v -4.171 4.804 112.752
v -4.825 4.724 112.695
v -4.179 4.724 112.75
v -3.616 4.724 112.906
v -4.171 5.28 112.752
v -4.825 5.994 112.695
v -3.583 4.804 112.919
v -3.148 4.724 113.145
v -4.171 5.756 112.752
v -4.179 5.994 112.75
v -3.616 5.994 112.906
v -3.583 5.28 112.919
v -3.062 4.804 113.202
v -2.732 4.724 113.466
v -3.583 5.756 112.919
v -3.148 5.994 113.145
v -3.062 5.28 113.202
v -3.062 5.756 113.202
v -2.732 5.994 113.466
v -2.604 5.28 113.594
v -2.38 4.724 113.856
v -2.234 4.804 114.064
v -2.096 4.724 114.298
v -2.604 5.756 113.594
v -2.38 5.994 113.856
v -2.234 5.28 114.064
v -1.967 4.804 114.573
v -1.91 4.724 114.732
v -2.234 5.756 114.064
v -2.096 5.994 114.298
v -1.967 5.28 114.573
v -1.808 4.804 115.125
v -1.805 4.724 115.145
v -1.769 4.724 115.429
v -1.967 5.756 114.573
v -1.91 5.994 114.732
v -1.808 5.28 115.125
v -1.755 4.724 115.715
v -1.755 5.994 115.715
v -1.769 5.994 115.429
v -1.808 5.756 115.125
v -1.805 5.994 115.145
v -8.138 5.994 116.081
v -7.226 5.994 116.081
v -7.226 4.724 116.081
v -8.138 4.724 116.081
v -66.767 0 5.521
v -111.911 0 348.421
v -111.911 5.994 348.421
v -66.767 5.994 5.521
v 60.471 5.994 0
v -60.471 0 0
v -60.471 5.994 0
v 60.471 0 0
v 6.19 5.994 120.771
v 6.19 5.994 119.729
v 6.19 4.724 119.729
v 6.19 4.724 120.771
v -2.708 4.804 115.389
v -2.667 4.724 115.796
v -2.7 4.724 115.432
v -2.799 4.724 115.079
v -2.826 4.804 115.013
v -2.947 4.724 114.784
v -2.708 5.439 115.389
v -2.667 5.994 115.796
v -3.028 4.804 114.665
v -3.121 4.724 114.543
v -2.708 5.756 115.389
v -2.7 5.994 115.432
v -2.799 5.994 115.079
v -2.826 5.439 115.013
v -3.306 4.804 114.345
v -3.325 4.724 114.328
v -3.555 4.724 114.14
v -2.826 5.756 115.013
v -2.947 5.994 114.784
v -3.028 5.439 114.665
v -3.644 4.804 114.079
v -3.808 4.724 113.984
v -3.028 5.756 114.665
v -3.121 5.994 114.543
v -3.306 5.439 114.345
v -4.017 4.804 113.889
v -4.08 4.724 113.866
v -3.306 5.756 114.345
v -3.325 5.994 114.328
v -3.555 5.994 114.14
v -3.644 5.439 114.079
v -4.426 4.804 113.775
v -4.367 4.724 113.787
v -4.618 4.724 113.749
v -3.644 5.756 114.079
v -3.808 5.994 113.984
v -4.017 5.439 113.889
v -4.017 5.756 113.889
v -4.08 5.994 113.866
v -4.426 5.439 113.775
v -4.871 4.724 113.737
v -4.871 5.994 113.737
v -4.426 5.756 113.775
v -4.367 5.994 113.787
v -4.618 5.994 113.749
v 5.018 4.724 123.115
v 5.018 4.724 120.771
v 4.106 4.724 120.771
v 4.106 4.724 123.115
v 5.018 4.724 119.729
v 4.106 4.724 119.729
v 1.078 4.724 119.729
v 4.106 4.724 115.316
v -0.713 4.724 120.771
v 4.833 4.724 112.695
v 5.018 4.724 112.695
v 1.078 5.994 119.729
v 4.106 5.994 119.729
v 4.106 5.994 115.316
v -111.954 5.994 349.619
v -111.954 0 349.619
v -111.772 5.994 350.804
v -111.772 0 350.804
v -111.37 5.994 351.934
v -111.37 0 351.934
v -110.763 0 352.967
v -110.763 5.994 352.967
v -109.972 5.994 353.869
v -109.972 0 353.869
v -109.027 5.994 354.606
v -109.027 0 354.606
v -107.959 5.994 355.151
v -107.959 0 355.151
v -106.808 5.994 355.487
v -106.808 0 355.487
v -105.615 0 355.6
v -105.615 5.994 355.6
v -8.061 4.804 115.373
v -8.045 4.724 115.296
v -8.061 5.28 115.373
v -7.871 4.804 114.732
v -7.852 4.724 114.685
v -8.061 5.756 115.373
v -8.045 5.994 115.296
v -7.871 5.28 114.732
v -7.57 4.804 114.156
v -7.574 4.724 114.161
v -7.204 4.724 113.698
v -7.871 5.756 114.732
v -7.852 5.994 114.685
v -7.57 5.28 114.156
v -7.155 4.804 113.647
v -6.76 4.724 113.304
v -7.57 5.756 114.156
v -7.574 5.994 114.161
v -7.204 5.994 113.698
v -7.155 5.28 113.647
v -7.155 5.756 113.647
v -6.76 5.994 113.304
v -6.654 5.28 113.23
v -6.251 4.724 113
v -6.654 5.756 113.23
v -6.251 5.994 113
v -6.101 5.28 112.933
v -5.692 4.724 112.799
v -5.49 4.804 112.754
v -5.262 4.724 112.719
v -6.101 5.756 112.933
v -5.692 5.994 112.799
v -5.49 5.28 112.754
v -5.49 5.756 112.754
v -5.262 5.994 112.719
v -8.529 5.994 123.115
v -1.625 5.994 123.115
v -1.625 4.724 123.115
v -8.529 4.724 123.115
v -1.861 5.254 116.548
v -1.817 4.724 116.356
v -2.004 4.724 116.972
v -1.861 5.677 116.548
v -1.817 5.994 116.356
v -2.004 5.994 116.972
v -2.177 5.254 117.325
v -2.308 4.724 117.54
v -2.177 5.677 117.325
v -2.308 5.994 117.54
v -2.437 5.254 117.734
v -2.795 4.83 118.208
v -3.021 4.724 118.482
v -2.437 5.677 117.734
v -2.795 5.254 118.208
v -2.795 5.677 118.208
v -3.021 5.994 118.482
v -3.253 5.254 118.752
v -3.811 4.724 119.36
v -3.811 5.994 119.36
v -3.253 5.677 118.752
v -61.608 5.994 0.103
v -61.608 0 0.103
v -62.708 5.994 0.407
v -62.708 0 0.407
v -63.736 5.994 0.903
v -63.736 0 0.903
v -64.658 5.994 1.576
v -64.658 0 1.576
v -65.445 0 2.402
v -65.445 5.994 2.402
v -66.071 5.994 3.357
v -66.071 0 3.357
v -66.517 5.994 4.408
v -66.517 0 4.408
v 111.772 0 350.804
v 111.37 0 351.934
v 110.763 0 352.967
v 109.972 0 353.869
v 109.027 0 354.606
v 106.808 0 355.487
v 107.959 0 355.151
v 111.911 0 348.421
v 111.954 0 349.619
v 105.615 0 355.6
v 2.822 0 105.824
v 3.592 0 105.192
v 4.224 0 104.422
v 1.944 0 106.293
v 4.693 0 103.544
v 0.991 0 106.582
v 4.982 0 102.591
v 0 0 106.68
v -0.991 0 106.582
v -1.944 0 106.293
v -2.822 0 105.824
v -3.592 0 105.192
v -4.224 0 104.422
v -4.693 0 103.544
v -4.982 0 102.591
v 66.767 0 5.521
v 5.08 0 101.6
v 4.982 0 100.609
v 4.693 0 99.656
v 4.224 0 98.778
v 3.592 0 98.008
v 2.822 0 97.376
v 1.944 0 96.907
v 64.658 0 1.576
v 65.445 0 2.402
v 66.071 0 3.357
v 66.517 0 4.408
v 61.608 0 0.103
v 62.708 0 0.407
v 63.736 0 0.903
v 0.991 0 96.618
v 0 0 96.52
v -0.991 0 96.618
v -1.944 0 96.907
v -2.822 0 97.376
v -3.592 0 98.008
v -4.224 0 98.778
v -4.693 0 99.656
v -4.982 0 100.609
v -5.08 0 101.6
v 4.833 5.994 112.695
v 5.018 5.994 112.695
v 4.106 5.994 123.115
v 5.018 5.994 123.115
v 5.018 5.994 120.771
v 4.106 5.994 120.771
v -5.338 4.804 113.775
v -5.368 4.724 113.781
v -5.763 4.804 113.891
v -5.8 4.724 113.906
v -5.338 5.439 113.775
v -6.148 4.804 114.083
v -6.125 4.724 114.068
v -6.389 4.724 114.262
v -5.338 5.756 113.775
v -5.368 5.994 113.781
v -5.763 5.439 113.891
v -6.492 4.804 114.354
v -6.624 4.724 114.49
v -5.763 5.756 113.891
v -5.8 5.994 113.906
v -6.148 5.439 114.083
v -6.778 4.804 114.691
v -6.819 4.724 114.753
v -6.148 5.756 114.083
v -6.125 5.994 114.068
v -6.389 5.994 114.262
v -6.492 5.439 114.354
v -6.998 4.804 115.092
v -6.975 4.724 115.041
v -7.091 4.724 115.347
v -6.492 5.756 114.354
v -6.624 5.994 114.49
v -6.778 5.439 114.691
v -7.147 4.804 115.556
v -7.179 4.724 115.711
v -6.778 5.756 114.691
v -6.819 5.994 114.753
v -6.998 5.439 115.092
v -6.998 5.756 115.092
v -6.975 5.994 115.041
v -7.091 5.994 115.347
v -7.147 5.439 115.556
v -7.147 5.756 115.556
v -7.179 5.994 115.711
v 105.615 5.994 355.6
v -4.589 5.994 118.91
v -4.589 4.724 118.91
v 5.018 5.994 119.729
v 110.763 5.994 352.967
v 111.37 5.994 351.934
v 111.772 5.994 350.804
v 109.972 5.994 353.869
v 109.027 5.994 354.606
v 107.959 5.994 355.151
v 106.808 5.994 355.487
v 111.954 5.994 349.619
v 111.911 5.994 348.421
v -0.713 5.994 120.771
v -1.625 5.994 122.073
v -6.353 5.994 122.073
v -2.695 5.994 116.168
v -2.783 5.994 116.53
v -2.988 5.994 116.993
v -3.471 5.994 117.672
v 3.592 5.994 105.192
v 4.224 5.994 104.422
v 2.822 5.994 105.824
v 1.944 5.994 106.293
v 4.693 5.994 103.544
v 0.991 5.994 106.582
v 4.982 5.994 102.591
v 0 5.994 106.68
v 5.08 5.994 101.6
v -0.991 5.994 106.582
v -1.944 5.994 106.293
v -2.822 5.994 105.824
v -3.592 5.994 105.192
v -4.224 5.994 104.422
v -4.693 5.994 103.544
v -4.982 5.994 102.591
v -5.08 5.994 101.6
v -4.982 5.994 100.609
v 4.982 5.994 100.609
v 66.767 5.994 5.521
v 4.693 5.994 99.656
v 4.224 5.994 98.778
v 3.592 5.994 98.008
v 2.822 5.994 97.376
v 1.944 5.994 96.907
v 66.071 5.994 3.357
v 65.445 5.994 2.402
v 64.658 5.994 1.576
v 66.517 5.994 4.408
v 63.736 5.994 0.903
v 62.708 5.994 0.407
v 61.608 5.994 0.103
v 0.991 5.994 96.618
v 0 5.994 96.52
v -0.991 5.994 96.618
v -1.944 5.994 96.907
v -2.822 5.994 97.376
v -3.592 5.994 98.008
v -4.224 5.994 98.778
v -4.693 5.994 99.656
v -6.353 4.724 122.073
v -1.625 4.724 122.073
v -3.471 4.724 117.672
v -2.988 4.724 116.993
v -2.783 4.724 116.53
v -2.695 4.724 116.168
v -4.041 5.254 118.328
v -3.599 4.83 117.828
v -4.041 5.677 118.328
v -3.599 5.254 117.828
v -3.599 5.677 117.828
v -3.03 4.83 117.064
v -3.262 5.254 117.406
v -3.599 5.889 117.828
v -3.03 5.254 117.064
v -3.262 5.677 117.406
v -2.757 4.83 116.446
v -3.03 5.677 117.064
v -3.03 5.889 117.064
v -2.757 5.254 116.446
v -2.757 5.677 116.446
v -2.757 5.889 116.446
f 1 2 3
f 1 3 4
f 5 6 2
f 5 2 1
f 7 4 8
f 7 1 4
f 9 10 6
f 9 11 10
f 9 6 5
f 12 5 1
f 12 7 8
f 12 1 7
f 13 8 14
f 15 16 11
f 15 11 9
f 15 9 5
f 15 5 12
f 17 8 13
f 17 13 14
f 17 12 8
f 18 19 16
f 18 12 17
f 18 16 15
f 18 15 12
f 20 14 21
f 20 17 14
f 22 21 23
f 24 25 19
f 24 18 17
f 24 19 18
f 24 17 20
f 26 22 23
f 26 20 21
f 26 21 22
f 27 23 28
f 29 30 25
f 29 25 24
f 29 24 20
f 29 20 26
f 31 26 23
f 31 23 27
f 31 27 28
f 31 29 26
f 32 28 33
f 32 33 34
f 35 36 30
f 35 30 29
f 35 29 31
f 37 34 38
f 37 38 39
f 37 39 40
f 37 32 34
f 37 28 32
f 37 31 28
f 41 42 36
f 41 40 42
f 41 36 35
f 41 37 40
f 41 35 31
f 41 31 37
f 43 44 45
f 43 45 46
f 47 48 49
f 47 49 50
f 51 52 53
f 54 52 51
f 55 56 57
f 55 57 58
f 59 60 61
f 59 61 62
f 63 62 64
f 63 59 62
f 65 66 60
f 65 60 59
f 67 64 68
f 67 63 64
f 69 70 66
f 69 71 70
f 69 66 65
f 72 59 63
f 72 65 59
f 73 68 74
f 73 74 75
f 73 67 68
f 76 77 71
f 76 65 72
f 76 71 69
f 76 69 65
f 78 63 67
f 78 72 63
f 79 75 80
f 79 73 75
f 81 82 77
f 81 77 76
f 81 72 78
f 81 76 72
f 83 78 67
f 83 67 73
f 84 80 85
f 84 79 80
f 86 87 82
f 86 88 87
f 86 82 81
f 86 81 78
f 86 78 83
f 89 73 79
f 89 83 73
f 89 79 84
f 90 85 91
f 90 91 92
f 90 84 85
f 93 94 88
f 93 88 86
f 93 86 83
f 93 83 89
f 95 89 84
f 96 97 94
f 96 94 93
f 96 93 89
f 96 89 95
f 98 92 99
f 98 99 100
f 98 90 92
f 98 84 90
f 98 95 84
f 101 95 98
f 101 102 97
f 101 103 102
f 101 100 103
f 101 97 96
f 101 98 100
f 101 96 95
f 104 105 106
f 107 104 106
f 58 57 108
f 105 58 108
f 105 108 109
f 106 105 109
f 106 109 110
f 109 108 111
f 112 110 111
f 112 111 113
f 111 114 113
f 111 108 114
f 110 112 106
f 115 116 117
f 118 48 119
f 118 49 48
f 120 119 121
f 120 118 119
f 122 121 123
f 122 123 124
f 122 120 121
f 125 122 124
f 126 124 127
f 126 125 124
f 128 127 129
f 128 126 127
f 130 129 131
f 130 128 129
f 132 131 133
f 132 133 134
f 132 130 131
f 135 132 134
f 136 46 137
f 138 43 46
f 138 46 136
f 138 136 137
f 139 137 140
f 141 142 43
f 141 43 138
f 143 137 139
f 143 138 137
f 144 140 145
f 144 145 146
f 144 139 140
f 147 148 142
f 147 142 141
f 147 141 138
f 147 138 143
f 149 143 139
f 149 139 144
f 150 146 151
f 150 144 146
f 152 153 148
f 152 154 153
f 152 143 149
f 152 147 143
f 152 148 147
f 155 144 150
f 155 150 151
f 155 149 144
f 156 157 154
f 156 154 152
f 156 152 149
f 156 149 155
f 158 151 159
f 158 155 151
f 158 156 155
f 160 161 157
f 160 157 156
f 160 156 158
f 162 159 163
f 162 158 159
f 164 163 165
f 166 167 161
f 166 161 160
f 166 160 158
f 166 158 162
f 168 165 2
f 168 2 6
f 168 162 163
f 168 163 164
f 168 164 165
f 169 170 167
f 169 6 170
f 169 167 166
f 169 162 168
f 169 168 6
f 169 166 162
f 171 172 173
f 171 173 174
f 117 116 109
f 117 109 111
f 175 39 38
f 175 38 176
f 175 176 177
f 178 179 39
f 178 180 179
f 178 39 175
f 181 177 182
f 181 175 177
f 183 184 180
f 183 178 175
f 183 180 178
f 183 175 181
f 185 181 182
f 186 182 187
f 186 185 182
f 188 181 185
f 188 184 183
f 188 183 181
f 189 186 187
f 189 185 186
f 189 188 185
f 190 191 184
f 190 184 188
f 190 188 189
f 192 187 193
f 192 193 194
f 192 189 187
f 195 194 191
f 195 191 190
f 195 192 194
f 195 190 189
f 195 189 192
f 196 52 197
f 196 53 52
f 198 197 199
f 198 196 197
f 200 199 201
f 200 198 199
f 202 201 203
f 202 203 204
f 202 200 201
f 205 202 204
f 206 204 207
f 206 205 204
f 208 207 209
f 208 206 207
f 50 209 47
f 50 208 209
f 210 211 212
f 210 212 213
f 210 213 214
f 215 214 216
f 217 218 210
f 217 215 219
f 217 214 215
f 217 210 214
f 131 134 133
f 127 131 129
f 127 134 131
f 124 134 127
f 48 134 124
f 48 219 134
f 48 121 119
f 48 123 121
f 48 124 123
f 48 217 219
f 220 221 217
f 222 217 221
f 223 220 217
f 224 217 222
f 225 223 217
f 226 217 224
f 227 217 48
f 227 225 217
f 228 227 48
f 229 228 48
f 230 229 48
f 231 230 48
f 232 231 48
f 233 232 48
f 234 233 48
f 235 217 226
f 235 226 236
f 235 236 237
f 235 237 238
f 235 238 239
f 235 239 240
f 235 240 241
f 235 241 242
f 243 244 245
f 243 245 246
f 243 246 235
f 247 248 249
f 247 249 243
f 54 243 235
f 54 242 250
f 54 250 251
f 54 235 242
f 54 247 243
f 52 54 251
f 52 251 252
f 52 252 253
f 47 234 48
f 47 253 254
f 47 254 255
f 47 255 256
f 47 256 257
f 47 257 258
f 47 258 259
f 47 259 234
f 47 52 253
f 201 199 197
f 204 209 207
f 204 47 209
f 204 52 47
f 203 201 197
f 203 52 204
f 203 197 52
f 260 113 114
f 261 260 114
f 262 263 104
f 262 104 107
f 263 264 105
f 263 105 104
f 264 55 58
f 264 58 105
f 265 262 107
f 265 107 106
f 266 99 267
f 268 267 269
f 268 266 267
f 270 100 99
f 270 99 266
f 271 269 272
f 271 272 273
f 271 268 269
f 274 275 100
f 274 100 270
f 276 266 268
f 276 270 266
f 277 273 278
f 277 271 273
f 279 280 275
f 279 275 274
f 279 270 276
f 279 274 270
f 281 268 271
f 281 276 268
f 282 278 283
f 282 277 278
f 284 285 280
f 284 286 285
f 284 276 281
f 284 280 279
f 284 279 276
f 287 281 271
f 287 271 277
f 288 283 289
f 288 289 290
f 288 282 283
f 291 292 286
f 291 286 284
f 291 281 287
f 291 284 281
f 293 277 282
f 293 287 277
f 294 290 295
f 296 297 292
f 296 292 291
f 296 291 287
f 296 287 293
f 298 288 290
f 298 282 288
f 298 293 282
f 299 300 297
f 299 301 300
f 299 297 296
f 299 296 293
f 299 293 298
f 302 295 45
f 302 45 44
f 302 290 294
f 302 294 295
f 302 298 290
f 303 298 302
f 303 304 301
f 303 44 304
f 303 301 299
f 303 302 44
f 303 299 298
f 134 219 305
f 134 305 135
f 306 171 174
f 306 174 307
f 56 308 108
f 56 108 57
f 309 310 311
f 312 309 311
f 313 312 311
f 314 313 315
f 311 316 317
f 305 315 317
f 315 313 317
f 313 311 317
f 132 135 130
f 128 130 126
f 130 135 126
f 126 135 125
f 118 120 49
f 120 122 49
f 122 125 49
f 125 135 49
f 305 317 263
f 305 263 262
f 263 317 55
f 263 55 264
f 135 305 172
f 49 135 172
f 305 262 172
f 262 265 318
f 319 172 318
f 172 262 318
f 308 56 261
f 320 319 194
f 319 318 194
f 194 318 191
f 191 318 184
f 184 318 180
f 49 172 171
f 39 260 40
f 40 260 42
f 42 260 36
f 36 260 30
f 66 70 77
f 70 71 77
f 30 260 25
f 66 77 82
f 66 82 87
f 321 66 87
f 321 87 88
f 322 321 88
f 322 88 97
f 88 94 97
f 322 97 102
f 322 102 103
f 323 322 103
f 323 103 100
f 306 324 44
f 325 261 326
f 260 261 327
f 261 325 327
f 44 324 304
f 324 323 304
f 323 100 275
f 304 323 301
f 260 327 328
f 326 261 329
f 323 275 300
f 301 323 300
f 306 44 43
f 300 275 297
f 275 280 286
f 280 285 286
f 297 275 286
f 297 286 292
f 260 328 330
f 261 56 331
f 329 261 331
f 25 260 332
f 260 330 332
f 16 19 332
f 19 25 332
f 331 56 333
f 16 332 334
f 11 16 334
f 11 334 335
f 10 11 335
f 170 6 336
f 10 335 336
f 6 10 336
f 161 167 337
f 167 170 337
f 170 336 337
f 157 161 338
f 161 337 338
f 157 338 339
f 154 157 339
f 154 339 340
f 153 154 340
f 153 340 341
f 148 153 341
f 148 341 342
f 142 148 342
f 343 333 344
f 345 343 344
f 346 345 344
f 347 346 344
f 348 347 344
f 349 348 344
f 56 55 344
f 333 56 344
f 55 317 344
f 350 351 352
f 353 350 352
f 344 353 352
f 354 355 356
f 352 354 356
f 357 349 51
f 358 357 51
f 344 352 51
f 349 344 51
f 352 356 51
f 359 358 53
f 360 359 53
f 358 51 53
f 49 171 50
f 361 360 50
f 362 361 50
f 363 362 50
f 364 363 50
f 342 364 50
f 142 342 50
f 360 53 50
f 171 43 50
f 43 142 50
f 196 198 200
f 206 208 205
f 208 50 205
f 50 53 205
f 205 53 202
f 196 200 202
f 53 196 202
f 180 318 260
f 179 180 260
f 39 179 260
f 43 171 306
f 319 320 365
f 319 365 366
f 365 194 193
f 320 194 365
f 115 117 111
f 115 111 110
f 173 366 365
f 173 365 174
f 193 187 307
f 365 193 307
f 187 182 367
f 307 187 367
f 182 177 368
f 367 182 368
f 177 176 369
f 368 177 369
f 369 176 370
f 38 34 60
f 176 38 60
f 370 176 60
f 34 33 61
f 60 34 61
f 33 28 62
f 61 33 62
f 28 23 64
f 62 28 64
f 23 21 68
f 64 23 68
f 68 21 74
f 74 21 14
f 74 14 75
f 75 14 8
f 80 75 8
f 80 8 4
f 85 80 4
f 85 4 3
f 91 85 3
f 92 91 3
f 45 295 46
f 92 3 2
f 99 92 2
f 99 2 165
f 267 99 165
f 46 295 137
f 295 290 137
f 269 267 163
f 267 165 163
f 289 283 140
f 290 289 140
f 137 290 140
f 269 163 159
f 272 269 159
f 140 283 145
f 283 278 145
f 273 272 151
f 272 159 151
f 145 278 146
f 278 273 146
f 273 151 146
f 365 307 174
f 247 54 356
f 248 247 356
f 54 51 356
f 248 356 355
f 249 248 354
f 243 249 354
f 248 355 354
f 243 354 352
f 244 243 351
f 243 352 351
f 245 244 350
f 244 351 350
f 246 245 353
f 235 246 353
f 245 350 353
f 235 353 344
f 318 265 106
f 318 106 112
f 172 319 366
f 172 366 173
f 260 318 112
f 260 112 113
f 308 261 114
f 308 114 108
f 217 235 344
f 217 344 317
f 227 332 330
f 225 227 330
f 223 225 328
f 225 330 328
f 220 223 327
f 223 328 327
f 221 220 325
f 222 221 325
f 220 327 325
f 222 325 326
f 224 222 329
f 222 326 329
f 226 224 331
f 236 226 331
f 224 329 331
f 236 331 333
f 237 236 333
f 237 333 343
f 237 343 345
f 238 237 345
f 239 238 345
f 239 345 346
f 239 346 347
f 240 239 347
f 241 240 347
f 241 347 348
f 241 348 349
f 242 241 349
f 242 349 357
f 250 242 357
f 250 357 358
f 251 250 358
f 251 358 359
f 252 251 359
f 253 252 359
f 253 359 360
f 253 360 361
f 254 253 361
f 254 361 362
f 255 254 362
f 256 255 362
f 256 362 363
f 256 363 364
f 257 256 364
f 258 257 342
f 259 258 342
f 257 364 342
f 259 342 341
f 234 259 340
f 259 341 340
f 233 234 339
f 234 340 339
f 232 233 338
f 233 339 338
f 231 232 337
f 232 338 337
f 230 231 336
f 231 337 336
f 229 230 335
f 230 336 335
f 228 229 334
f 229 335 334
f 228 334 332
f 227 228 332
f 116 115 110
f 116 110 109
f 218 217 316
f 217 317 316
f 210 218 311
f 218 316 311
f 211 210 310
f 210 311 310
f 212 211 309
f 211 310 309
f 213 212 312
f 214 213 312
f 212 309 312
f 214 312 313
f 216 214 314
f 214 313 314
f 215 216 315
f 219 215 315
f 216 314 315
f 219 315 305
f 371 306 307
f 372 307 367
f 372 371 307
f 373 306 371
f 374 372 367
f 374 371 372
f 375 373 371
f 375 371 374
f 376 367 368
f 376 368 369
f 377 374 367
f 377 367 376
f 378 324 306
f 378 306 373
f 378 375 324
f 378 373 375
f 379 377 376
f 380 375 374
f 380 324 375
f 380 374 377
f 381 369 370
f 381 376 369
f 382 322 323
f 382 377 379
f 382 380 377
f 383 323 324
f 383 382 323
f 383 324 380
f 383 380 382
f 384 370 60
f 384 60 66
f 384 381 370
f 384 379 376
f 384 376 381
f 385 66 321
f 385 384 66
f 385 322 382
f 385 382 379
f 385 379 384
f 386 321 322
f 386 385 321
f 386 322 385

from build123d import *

# Parameters (mm, degrees)
BOSS_EXTRUDE1_DEPTH = 5.9944
SKETCH2_R           = 5.08
CUT_EXTRUDE1_DEPTH  = 374.126902856
CUT_EXTRUDE2_DEPTH  = 1.27
FILLET1_R           = 6.35


with BuildPart() as part:
    # Sketch1 → Boss-Extrude1 (new body)
    with BuildSketch(Plane(origin=(0, 0, 0), x_dir=(1, 0, 0), z_dir=(0, 1, 0))):
        Polygon((-66.04, 0), (66.04, 0), (112.855628142, -355.6), (-112.855628142, -355.6), align=None)
    extrude(amount=BOSS_EXTRUDE1_DEPTH)

    # Sketch2 → Cut-Extrude1 (cut, through all)
    with BuildSketch(Plane(origin=(0, 5.9944, 0), x_dir=(1, 0, 0), z_dir=(0, 1, 0))):
        with Locations(Location((0, -101.6, 0), (0, 0, 270))):
            Circle(SKETCH2_R)
    extrude(amount=-CUT_EXTRUDE1_DEPTH, mode=Mode.SUBTRACT)

    # Sketch3 → Cut-Extrude2 (cut)
    # profile 1 of 2: a face of its own
    with BuildSketch(Plane(origin=(0, 5.9944, 0), x_dir=(1, 0, 0), z_dir=(0, 1, 0))):
        with BuildLine():
            Line((-7.226250791, -116.081432875), (-8.138045663, -116.081432875))
            add(Edge.make_bspline(
                [(-8.138045663, -116.081432875), (-8.13210307, -115.960468241), (-8.120431976, -115.722896918), (-8.065776142, -115.376516664), (-7.987570625, -115.045431877), (-7.876996575, -114.732300927), (-7.739673209, -114.434355132), (-7.574994044, -114.152777944), (-7.379939895, -113.888643522), (-7.158722633, -113.644400479), (-6.918457097, -113.420335988), (-6.659214713, -113.22684534), (-6.386796005, -113.063363186), (-6.102027464, -112.926693067), (-5.801696228, -112.824106543), (-5.488527704, -112.747988869), (-5.161145982, -112.702192391), (-4.938090375, -112.697269768), (-4.824648227, -112.694766208)],
                knots=[0, 0, 0, 0, 1.10065271, 2.161652631, 3.183658789, 4.190468796, 5.17591951, 6.163126047, 7.15150782, 8.156236427, 9.156009102, 10.134482811, 11.092018607, 12.041330605, 13.001268258, 13.972401359, 14.968799086, 16, 16, 16, 16], degree=3))
            add(Edge.make_bspline(
                [(-4.824648227, -112.694766208), (-4.713242161, -112.697374299), (-4.49433322, -112.702499104), (-4.174838915, -112.746509406), (-3.870685397, -112.815439466), (-3.582467195, -112.91214936), (-3.312483876, -113.042152155), (-3.058707267, -113.198318725), (-2.818116113, -113.378934007), (-2.601543278, -113.591579362), (-2.402674111, -113.818589713), (-2.231108708, -114.06094317), (-2.084185925, -114.311254468), (-1.961721117, -114.571432333), (-1.871569582, -114.843926518), (-1.803125412, -115.124769827), (-1.764437834, -115.416869279), (-1.758500262, -115.61457288), (-1.755481561, -115.715086721)],
                knots=[0, 0, 0, 0, 1.111607364, 2.184268762, 3.212621178, 4.221274766, 5.211760367, 6.196651075, 7.1921475, 8.207485113, 9.220403448, 10.201281604, 11.166441695, 12.114753415, 13.065576456, 14.026450734, 14.996634279, 16, 16, 16, 16], degree=3))
            add(Edge.make_bspline(
                [(-1.755481561, -115.715086721), (-1.760396861, -115.856594721), (-1.770141205, -116.137127455), (-1.853494938, -116.549376314), (-1.983677953, -116.948790353), (-2.140424566, -117.270244922), (-2.298550289, -117.529277006), (-2.441044311, -117.742546161), (-2.607856448, -117.972178035), (-2.801414602, -118.217403677), (-3.017714826, -118.480143905), (-3.258716305, -118.760239997), (-3.526137613, -119.054798048), (-3.713832004, -119.255982308), (-3.811090535, -119.360230952)],
                knots=[0, 0, 0, 0, 1.184426356, 2.348067706, 3.509069118, 4.696110526, 5.333549288, 6.050745305, 6.844228056, 7.710549037, 8.667450064, 9.695053472, 10.805634456, 12, 12, 12, 12], degree=3))
            Line((-3.811090535, -119.360230952), (-6.353125791, -122.073227747))
            Line((-6.353125791, -122.073227747), (-1.62522515, -122.073227747))
            Line((-1.62522515, -122.073227747), (-1.62522515, -123.115279029))
            Line((-1.62522515, -123.115279029), (-8.528814894, -123.115279029))
            Line((-8.528814894, -123.115279029), (-4.588558484, -118.910439285))
            add(Edge.make_bspline(
                [(-4.588558484, -118.910439285), (-4.492625189, -118.810295629), (-4.308356964, -118.617940162), (-4.04773097, -118.337109169), (-3.813647507, -118.076579074), (-3.604591304, -117.836842122), (-3.425097471, -117.614391628), (-3.265811221, -117.416432145), (-3.138185391, -117.234264941), (-2.999674414, -117.02310933), (-2.865521828, -116.765299861), (-2.750242531, -116.450242066), (-2.679950285, -116.125913812), (-2.671517963, -115.906742185), (-2.667276432, -115.796496977)],
                knots=[0, 0, 0, 0, 1.329631726, 2.553950428, 3.673215718, 4.687767853, 5.603093632, 6.413772471, 7.123043292, 7.734684054, 8.834405432, 9.900288307, 10.943827018, 12, 12, 12, 12], degree=3))
            add(Edge.make_bspline(
                [(-2.667276432, -115.796496977), (-2.669121901, -115.727172689), (-2.672758967, -115.59054783), (-2.704857883, -115.39023397), (-2.753366095, -115.197005824), (-2.822875758, -115.010269033), (-2.914625609, -114.831901083), (-3.026308335, -114.661684855), (-3.155166348, -114.497124887), (-3.304231747, -114.342828456), (-3.46798633, -114.201513871), (-3.640979923, -114.076330812), (-3.824005368, -113.971714421), (-4.01629098, -113.88595387), (-4.217300686, -113.818679049), (-4.42742326, -113.772063287), (-4.646078119, -113.742795276), (-4.795382209, -113.73883528), (-4.871459125, -113.73681749)],
                knots=[0, 0, 0, 0, 0.991446411, 1.95395049, 2.89581595, 3.838931463, 4.798493298, 5.75982156, 6.748411868, 7.785213223, 8.824556874, 9.840280684, 10.836137867, 11.835679398, 12.848801643, 13.863922112, 14.911575587, 16, 16, 16, 16], degree=3))
            add(Edge.make_bspline(
                [(-4.871459125, -113.73681749), (-4.950912742, -113.738893127), (-5.106946528, -113.742969334), (-5.336037206, -113.771483124), (-5.554581063, -113.820674478), (-5.763127844, -113.887953053), (-5.962030413, -113.973467012), (-6.150321467, -114.079977905), (-6.327578311, -114.207075131), (-6.494134162, -114.351174574), (-6.647590741, -114.511608525), (-6.782419386, -114.690453447), (-6.900228982, -114.884443887), (-7.003016928, -115.093056411), (-7.086490588, -115.318183955), (-7.150275505, -115.559027349), (-7.200747037, -115.814540845), (-7.217608343, -115.990991263), (-7.226250791, -116.081432875)],
                knots=[0, 0, 0, 0, 1.031018746, 2.02475058, 2.990194455, 3.934040569, 4.864654155, 5.795059489, 6.735614925, 7.690564532, 8.649604399, 9.611025574, 10.590972636, 11.591080095, 12.624614302, 13.701020113, 14.821632451, 16, 16, 16, 16], degree=3))
        make_face()
    # profile 2 of 2: a face of its own
    with BuildSketch(Plane(origin=(0, 5.9944, 0), x_dir=(1, 0, 0), z_dir=(0, 1, 0))):
        Polygon((4.832643439, -112.694766208), (5.017851773, -112.694766208), (5.017851773, -119.728612362), (6.190159465, -119.728612362), (6.190159465, -120.770663644), (5.017851773, -120.770663644), (5.017851773, -123.115279029), (4.106056901, -123.115279029), (4.106056901, -120.770663644), (-0.713430279, -120.770663644), align=None)
        Polygon((4.106056901, -119.728612362), (4.106056901, -115.316176465), (1.077595362, -119.728612362), align=None, mode=Mode.SUBTRACT)
    extrude(amount=-CUT_EXTRUDE2_DEPTH, mode=Mode.SUBTRACT)

    # Fillet1
    fillet1_edges = [part.edges().sort_by_distance(p)[0] for p in [
        (112.855628142, 2.9972, 355.6),
        (-112.855628142, 2.9972, 355.6),
        (-66.04, 2.9972, 0),
        (66.04, 2.9972, 0),
    ]]
    fillet(fillet1_edges, radius=FILLET1_R)


solid = part.part
